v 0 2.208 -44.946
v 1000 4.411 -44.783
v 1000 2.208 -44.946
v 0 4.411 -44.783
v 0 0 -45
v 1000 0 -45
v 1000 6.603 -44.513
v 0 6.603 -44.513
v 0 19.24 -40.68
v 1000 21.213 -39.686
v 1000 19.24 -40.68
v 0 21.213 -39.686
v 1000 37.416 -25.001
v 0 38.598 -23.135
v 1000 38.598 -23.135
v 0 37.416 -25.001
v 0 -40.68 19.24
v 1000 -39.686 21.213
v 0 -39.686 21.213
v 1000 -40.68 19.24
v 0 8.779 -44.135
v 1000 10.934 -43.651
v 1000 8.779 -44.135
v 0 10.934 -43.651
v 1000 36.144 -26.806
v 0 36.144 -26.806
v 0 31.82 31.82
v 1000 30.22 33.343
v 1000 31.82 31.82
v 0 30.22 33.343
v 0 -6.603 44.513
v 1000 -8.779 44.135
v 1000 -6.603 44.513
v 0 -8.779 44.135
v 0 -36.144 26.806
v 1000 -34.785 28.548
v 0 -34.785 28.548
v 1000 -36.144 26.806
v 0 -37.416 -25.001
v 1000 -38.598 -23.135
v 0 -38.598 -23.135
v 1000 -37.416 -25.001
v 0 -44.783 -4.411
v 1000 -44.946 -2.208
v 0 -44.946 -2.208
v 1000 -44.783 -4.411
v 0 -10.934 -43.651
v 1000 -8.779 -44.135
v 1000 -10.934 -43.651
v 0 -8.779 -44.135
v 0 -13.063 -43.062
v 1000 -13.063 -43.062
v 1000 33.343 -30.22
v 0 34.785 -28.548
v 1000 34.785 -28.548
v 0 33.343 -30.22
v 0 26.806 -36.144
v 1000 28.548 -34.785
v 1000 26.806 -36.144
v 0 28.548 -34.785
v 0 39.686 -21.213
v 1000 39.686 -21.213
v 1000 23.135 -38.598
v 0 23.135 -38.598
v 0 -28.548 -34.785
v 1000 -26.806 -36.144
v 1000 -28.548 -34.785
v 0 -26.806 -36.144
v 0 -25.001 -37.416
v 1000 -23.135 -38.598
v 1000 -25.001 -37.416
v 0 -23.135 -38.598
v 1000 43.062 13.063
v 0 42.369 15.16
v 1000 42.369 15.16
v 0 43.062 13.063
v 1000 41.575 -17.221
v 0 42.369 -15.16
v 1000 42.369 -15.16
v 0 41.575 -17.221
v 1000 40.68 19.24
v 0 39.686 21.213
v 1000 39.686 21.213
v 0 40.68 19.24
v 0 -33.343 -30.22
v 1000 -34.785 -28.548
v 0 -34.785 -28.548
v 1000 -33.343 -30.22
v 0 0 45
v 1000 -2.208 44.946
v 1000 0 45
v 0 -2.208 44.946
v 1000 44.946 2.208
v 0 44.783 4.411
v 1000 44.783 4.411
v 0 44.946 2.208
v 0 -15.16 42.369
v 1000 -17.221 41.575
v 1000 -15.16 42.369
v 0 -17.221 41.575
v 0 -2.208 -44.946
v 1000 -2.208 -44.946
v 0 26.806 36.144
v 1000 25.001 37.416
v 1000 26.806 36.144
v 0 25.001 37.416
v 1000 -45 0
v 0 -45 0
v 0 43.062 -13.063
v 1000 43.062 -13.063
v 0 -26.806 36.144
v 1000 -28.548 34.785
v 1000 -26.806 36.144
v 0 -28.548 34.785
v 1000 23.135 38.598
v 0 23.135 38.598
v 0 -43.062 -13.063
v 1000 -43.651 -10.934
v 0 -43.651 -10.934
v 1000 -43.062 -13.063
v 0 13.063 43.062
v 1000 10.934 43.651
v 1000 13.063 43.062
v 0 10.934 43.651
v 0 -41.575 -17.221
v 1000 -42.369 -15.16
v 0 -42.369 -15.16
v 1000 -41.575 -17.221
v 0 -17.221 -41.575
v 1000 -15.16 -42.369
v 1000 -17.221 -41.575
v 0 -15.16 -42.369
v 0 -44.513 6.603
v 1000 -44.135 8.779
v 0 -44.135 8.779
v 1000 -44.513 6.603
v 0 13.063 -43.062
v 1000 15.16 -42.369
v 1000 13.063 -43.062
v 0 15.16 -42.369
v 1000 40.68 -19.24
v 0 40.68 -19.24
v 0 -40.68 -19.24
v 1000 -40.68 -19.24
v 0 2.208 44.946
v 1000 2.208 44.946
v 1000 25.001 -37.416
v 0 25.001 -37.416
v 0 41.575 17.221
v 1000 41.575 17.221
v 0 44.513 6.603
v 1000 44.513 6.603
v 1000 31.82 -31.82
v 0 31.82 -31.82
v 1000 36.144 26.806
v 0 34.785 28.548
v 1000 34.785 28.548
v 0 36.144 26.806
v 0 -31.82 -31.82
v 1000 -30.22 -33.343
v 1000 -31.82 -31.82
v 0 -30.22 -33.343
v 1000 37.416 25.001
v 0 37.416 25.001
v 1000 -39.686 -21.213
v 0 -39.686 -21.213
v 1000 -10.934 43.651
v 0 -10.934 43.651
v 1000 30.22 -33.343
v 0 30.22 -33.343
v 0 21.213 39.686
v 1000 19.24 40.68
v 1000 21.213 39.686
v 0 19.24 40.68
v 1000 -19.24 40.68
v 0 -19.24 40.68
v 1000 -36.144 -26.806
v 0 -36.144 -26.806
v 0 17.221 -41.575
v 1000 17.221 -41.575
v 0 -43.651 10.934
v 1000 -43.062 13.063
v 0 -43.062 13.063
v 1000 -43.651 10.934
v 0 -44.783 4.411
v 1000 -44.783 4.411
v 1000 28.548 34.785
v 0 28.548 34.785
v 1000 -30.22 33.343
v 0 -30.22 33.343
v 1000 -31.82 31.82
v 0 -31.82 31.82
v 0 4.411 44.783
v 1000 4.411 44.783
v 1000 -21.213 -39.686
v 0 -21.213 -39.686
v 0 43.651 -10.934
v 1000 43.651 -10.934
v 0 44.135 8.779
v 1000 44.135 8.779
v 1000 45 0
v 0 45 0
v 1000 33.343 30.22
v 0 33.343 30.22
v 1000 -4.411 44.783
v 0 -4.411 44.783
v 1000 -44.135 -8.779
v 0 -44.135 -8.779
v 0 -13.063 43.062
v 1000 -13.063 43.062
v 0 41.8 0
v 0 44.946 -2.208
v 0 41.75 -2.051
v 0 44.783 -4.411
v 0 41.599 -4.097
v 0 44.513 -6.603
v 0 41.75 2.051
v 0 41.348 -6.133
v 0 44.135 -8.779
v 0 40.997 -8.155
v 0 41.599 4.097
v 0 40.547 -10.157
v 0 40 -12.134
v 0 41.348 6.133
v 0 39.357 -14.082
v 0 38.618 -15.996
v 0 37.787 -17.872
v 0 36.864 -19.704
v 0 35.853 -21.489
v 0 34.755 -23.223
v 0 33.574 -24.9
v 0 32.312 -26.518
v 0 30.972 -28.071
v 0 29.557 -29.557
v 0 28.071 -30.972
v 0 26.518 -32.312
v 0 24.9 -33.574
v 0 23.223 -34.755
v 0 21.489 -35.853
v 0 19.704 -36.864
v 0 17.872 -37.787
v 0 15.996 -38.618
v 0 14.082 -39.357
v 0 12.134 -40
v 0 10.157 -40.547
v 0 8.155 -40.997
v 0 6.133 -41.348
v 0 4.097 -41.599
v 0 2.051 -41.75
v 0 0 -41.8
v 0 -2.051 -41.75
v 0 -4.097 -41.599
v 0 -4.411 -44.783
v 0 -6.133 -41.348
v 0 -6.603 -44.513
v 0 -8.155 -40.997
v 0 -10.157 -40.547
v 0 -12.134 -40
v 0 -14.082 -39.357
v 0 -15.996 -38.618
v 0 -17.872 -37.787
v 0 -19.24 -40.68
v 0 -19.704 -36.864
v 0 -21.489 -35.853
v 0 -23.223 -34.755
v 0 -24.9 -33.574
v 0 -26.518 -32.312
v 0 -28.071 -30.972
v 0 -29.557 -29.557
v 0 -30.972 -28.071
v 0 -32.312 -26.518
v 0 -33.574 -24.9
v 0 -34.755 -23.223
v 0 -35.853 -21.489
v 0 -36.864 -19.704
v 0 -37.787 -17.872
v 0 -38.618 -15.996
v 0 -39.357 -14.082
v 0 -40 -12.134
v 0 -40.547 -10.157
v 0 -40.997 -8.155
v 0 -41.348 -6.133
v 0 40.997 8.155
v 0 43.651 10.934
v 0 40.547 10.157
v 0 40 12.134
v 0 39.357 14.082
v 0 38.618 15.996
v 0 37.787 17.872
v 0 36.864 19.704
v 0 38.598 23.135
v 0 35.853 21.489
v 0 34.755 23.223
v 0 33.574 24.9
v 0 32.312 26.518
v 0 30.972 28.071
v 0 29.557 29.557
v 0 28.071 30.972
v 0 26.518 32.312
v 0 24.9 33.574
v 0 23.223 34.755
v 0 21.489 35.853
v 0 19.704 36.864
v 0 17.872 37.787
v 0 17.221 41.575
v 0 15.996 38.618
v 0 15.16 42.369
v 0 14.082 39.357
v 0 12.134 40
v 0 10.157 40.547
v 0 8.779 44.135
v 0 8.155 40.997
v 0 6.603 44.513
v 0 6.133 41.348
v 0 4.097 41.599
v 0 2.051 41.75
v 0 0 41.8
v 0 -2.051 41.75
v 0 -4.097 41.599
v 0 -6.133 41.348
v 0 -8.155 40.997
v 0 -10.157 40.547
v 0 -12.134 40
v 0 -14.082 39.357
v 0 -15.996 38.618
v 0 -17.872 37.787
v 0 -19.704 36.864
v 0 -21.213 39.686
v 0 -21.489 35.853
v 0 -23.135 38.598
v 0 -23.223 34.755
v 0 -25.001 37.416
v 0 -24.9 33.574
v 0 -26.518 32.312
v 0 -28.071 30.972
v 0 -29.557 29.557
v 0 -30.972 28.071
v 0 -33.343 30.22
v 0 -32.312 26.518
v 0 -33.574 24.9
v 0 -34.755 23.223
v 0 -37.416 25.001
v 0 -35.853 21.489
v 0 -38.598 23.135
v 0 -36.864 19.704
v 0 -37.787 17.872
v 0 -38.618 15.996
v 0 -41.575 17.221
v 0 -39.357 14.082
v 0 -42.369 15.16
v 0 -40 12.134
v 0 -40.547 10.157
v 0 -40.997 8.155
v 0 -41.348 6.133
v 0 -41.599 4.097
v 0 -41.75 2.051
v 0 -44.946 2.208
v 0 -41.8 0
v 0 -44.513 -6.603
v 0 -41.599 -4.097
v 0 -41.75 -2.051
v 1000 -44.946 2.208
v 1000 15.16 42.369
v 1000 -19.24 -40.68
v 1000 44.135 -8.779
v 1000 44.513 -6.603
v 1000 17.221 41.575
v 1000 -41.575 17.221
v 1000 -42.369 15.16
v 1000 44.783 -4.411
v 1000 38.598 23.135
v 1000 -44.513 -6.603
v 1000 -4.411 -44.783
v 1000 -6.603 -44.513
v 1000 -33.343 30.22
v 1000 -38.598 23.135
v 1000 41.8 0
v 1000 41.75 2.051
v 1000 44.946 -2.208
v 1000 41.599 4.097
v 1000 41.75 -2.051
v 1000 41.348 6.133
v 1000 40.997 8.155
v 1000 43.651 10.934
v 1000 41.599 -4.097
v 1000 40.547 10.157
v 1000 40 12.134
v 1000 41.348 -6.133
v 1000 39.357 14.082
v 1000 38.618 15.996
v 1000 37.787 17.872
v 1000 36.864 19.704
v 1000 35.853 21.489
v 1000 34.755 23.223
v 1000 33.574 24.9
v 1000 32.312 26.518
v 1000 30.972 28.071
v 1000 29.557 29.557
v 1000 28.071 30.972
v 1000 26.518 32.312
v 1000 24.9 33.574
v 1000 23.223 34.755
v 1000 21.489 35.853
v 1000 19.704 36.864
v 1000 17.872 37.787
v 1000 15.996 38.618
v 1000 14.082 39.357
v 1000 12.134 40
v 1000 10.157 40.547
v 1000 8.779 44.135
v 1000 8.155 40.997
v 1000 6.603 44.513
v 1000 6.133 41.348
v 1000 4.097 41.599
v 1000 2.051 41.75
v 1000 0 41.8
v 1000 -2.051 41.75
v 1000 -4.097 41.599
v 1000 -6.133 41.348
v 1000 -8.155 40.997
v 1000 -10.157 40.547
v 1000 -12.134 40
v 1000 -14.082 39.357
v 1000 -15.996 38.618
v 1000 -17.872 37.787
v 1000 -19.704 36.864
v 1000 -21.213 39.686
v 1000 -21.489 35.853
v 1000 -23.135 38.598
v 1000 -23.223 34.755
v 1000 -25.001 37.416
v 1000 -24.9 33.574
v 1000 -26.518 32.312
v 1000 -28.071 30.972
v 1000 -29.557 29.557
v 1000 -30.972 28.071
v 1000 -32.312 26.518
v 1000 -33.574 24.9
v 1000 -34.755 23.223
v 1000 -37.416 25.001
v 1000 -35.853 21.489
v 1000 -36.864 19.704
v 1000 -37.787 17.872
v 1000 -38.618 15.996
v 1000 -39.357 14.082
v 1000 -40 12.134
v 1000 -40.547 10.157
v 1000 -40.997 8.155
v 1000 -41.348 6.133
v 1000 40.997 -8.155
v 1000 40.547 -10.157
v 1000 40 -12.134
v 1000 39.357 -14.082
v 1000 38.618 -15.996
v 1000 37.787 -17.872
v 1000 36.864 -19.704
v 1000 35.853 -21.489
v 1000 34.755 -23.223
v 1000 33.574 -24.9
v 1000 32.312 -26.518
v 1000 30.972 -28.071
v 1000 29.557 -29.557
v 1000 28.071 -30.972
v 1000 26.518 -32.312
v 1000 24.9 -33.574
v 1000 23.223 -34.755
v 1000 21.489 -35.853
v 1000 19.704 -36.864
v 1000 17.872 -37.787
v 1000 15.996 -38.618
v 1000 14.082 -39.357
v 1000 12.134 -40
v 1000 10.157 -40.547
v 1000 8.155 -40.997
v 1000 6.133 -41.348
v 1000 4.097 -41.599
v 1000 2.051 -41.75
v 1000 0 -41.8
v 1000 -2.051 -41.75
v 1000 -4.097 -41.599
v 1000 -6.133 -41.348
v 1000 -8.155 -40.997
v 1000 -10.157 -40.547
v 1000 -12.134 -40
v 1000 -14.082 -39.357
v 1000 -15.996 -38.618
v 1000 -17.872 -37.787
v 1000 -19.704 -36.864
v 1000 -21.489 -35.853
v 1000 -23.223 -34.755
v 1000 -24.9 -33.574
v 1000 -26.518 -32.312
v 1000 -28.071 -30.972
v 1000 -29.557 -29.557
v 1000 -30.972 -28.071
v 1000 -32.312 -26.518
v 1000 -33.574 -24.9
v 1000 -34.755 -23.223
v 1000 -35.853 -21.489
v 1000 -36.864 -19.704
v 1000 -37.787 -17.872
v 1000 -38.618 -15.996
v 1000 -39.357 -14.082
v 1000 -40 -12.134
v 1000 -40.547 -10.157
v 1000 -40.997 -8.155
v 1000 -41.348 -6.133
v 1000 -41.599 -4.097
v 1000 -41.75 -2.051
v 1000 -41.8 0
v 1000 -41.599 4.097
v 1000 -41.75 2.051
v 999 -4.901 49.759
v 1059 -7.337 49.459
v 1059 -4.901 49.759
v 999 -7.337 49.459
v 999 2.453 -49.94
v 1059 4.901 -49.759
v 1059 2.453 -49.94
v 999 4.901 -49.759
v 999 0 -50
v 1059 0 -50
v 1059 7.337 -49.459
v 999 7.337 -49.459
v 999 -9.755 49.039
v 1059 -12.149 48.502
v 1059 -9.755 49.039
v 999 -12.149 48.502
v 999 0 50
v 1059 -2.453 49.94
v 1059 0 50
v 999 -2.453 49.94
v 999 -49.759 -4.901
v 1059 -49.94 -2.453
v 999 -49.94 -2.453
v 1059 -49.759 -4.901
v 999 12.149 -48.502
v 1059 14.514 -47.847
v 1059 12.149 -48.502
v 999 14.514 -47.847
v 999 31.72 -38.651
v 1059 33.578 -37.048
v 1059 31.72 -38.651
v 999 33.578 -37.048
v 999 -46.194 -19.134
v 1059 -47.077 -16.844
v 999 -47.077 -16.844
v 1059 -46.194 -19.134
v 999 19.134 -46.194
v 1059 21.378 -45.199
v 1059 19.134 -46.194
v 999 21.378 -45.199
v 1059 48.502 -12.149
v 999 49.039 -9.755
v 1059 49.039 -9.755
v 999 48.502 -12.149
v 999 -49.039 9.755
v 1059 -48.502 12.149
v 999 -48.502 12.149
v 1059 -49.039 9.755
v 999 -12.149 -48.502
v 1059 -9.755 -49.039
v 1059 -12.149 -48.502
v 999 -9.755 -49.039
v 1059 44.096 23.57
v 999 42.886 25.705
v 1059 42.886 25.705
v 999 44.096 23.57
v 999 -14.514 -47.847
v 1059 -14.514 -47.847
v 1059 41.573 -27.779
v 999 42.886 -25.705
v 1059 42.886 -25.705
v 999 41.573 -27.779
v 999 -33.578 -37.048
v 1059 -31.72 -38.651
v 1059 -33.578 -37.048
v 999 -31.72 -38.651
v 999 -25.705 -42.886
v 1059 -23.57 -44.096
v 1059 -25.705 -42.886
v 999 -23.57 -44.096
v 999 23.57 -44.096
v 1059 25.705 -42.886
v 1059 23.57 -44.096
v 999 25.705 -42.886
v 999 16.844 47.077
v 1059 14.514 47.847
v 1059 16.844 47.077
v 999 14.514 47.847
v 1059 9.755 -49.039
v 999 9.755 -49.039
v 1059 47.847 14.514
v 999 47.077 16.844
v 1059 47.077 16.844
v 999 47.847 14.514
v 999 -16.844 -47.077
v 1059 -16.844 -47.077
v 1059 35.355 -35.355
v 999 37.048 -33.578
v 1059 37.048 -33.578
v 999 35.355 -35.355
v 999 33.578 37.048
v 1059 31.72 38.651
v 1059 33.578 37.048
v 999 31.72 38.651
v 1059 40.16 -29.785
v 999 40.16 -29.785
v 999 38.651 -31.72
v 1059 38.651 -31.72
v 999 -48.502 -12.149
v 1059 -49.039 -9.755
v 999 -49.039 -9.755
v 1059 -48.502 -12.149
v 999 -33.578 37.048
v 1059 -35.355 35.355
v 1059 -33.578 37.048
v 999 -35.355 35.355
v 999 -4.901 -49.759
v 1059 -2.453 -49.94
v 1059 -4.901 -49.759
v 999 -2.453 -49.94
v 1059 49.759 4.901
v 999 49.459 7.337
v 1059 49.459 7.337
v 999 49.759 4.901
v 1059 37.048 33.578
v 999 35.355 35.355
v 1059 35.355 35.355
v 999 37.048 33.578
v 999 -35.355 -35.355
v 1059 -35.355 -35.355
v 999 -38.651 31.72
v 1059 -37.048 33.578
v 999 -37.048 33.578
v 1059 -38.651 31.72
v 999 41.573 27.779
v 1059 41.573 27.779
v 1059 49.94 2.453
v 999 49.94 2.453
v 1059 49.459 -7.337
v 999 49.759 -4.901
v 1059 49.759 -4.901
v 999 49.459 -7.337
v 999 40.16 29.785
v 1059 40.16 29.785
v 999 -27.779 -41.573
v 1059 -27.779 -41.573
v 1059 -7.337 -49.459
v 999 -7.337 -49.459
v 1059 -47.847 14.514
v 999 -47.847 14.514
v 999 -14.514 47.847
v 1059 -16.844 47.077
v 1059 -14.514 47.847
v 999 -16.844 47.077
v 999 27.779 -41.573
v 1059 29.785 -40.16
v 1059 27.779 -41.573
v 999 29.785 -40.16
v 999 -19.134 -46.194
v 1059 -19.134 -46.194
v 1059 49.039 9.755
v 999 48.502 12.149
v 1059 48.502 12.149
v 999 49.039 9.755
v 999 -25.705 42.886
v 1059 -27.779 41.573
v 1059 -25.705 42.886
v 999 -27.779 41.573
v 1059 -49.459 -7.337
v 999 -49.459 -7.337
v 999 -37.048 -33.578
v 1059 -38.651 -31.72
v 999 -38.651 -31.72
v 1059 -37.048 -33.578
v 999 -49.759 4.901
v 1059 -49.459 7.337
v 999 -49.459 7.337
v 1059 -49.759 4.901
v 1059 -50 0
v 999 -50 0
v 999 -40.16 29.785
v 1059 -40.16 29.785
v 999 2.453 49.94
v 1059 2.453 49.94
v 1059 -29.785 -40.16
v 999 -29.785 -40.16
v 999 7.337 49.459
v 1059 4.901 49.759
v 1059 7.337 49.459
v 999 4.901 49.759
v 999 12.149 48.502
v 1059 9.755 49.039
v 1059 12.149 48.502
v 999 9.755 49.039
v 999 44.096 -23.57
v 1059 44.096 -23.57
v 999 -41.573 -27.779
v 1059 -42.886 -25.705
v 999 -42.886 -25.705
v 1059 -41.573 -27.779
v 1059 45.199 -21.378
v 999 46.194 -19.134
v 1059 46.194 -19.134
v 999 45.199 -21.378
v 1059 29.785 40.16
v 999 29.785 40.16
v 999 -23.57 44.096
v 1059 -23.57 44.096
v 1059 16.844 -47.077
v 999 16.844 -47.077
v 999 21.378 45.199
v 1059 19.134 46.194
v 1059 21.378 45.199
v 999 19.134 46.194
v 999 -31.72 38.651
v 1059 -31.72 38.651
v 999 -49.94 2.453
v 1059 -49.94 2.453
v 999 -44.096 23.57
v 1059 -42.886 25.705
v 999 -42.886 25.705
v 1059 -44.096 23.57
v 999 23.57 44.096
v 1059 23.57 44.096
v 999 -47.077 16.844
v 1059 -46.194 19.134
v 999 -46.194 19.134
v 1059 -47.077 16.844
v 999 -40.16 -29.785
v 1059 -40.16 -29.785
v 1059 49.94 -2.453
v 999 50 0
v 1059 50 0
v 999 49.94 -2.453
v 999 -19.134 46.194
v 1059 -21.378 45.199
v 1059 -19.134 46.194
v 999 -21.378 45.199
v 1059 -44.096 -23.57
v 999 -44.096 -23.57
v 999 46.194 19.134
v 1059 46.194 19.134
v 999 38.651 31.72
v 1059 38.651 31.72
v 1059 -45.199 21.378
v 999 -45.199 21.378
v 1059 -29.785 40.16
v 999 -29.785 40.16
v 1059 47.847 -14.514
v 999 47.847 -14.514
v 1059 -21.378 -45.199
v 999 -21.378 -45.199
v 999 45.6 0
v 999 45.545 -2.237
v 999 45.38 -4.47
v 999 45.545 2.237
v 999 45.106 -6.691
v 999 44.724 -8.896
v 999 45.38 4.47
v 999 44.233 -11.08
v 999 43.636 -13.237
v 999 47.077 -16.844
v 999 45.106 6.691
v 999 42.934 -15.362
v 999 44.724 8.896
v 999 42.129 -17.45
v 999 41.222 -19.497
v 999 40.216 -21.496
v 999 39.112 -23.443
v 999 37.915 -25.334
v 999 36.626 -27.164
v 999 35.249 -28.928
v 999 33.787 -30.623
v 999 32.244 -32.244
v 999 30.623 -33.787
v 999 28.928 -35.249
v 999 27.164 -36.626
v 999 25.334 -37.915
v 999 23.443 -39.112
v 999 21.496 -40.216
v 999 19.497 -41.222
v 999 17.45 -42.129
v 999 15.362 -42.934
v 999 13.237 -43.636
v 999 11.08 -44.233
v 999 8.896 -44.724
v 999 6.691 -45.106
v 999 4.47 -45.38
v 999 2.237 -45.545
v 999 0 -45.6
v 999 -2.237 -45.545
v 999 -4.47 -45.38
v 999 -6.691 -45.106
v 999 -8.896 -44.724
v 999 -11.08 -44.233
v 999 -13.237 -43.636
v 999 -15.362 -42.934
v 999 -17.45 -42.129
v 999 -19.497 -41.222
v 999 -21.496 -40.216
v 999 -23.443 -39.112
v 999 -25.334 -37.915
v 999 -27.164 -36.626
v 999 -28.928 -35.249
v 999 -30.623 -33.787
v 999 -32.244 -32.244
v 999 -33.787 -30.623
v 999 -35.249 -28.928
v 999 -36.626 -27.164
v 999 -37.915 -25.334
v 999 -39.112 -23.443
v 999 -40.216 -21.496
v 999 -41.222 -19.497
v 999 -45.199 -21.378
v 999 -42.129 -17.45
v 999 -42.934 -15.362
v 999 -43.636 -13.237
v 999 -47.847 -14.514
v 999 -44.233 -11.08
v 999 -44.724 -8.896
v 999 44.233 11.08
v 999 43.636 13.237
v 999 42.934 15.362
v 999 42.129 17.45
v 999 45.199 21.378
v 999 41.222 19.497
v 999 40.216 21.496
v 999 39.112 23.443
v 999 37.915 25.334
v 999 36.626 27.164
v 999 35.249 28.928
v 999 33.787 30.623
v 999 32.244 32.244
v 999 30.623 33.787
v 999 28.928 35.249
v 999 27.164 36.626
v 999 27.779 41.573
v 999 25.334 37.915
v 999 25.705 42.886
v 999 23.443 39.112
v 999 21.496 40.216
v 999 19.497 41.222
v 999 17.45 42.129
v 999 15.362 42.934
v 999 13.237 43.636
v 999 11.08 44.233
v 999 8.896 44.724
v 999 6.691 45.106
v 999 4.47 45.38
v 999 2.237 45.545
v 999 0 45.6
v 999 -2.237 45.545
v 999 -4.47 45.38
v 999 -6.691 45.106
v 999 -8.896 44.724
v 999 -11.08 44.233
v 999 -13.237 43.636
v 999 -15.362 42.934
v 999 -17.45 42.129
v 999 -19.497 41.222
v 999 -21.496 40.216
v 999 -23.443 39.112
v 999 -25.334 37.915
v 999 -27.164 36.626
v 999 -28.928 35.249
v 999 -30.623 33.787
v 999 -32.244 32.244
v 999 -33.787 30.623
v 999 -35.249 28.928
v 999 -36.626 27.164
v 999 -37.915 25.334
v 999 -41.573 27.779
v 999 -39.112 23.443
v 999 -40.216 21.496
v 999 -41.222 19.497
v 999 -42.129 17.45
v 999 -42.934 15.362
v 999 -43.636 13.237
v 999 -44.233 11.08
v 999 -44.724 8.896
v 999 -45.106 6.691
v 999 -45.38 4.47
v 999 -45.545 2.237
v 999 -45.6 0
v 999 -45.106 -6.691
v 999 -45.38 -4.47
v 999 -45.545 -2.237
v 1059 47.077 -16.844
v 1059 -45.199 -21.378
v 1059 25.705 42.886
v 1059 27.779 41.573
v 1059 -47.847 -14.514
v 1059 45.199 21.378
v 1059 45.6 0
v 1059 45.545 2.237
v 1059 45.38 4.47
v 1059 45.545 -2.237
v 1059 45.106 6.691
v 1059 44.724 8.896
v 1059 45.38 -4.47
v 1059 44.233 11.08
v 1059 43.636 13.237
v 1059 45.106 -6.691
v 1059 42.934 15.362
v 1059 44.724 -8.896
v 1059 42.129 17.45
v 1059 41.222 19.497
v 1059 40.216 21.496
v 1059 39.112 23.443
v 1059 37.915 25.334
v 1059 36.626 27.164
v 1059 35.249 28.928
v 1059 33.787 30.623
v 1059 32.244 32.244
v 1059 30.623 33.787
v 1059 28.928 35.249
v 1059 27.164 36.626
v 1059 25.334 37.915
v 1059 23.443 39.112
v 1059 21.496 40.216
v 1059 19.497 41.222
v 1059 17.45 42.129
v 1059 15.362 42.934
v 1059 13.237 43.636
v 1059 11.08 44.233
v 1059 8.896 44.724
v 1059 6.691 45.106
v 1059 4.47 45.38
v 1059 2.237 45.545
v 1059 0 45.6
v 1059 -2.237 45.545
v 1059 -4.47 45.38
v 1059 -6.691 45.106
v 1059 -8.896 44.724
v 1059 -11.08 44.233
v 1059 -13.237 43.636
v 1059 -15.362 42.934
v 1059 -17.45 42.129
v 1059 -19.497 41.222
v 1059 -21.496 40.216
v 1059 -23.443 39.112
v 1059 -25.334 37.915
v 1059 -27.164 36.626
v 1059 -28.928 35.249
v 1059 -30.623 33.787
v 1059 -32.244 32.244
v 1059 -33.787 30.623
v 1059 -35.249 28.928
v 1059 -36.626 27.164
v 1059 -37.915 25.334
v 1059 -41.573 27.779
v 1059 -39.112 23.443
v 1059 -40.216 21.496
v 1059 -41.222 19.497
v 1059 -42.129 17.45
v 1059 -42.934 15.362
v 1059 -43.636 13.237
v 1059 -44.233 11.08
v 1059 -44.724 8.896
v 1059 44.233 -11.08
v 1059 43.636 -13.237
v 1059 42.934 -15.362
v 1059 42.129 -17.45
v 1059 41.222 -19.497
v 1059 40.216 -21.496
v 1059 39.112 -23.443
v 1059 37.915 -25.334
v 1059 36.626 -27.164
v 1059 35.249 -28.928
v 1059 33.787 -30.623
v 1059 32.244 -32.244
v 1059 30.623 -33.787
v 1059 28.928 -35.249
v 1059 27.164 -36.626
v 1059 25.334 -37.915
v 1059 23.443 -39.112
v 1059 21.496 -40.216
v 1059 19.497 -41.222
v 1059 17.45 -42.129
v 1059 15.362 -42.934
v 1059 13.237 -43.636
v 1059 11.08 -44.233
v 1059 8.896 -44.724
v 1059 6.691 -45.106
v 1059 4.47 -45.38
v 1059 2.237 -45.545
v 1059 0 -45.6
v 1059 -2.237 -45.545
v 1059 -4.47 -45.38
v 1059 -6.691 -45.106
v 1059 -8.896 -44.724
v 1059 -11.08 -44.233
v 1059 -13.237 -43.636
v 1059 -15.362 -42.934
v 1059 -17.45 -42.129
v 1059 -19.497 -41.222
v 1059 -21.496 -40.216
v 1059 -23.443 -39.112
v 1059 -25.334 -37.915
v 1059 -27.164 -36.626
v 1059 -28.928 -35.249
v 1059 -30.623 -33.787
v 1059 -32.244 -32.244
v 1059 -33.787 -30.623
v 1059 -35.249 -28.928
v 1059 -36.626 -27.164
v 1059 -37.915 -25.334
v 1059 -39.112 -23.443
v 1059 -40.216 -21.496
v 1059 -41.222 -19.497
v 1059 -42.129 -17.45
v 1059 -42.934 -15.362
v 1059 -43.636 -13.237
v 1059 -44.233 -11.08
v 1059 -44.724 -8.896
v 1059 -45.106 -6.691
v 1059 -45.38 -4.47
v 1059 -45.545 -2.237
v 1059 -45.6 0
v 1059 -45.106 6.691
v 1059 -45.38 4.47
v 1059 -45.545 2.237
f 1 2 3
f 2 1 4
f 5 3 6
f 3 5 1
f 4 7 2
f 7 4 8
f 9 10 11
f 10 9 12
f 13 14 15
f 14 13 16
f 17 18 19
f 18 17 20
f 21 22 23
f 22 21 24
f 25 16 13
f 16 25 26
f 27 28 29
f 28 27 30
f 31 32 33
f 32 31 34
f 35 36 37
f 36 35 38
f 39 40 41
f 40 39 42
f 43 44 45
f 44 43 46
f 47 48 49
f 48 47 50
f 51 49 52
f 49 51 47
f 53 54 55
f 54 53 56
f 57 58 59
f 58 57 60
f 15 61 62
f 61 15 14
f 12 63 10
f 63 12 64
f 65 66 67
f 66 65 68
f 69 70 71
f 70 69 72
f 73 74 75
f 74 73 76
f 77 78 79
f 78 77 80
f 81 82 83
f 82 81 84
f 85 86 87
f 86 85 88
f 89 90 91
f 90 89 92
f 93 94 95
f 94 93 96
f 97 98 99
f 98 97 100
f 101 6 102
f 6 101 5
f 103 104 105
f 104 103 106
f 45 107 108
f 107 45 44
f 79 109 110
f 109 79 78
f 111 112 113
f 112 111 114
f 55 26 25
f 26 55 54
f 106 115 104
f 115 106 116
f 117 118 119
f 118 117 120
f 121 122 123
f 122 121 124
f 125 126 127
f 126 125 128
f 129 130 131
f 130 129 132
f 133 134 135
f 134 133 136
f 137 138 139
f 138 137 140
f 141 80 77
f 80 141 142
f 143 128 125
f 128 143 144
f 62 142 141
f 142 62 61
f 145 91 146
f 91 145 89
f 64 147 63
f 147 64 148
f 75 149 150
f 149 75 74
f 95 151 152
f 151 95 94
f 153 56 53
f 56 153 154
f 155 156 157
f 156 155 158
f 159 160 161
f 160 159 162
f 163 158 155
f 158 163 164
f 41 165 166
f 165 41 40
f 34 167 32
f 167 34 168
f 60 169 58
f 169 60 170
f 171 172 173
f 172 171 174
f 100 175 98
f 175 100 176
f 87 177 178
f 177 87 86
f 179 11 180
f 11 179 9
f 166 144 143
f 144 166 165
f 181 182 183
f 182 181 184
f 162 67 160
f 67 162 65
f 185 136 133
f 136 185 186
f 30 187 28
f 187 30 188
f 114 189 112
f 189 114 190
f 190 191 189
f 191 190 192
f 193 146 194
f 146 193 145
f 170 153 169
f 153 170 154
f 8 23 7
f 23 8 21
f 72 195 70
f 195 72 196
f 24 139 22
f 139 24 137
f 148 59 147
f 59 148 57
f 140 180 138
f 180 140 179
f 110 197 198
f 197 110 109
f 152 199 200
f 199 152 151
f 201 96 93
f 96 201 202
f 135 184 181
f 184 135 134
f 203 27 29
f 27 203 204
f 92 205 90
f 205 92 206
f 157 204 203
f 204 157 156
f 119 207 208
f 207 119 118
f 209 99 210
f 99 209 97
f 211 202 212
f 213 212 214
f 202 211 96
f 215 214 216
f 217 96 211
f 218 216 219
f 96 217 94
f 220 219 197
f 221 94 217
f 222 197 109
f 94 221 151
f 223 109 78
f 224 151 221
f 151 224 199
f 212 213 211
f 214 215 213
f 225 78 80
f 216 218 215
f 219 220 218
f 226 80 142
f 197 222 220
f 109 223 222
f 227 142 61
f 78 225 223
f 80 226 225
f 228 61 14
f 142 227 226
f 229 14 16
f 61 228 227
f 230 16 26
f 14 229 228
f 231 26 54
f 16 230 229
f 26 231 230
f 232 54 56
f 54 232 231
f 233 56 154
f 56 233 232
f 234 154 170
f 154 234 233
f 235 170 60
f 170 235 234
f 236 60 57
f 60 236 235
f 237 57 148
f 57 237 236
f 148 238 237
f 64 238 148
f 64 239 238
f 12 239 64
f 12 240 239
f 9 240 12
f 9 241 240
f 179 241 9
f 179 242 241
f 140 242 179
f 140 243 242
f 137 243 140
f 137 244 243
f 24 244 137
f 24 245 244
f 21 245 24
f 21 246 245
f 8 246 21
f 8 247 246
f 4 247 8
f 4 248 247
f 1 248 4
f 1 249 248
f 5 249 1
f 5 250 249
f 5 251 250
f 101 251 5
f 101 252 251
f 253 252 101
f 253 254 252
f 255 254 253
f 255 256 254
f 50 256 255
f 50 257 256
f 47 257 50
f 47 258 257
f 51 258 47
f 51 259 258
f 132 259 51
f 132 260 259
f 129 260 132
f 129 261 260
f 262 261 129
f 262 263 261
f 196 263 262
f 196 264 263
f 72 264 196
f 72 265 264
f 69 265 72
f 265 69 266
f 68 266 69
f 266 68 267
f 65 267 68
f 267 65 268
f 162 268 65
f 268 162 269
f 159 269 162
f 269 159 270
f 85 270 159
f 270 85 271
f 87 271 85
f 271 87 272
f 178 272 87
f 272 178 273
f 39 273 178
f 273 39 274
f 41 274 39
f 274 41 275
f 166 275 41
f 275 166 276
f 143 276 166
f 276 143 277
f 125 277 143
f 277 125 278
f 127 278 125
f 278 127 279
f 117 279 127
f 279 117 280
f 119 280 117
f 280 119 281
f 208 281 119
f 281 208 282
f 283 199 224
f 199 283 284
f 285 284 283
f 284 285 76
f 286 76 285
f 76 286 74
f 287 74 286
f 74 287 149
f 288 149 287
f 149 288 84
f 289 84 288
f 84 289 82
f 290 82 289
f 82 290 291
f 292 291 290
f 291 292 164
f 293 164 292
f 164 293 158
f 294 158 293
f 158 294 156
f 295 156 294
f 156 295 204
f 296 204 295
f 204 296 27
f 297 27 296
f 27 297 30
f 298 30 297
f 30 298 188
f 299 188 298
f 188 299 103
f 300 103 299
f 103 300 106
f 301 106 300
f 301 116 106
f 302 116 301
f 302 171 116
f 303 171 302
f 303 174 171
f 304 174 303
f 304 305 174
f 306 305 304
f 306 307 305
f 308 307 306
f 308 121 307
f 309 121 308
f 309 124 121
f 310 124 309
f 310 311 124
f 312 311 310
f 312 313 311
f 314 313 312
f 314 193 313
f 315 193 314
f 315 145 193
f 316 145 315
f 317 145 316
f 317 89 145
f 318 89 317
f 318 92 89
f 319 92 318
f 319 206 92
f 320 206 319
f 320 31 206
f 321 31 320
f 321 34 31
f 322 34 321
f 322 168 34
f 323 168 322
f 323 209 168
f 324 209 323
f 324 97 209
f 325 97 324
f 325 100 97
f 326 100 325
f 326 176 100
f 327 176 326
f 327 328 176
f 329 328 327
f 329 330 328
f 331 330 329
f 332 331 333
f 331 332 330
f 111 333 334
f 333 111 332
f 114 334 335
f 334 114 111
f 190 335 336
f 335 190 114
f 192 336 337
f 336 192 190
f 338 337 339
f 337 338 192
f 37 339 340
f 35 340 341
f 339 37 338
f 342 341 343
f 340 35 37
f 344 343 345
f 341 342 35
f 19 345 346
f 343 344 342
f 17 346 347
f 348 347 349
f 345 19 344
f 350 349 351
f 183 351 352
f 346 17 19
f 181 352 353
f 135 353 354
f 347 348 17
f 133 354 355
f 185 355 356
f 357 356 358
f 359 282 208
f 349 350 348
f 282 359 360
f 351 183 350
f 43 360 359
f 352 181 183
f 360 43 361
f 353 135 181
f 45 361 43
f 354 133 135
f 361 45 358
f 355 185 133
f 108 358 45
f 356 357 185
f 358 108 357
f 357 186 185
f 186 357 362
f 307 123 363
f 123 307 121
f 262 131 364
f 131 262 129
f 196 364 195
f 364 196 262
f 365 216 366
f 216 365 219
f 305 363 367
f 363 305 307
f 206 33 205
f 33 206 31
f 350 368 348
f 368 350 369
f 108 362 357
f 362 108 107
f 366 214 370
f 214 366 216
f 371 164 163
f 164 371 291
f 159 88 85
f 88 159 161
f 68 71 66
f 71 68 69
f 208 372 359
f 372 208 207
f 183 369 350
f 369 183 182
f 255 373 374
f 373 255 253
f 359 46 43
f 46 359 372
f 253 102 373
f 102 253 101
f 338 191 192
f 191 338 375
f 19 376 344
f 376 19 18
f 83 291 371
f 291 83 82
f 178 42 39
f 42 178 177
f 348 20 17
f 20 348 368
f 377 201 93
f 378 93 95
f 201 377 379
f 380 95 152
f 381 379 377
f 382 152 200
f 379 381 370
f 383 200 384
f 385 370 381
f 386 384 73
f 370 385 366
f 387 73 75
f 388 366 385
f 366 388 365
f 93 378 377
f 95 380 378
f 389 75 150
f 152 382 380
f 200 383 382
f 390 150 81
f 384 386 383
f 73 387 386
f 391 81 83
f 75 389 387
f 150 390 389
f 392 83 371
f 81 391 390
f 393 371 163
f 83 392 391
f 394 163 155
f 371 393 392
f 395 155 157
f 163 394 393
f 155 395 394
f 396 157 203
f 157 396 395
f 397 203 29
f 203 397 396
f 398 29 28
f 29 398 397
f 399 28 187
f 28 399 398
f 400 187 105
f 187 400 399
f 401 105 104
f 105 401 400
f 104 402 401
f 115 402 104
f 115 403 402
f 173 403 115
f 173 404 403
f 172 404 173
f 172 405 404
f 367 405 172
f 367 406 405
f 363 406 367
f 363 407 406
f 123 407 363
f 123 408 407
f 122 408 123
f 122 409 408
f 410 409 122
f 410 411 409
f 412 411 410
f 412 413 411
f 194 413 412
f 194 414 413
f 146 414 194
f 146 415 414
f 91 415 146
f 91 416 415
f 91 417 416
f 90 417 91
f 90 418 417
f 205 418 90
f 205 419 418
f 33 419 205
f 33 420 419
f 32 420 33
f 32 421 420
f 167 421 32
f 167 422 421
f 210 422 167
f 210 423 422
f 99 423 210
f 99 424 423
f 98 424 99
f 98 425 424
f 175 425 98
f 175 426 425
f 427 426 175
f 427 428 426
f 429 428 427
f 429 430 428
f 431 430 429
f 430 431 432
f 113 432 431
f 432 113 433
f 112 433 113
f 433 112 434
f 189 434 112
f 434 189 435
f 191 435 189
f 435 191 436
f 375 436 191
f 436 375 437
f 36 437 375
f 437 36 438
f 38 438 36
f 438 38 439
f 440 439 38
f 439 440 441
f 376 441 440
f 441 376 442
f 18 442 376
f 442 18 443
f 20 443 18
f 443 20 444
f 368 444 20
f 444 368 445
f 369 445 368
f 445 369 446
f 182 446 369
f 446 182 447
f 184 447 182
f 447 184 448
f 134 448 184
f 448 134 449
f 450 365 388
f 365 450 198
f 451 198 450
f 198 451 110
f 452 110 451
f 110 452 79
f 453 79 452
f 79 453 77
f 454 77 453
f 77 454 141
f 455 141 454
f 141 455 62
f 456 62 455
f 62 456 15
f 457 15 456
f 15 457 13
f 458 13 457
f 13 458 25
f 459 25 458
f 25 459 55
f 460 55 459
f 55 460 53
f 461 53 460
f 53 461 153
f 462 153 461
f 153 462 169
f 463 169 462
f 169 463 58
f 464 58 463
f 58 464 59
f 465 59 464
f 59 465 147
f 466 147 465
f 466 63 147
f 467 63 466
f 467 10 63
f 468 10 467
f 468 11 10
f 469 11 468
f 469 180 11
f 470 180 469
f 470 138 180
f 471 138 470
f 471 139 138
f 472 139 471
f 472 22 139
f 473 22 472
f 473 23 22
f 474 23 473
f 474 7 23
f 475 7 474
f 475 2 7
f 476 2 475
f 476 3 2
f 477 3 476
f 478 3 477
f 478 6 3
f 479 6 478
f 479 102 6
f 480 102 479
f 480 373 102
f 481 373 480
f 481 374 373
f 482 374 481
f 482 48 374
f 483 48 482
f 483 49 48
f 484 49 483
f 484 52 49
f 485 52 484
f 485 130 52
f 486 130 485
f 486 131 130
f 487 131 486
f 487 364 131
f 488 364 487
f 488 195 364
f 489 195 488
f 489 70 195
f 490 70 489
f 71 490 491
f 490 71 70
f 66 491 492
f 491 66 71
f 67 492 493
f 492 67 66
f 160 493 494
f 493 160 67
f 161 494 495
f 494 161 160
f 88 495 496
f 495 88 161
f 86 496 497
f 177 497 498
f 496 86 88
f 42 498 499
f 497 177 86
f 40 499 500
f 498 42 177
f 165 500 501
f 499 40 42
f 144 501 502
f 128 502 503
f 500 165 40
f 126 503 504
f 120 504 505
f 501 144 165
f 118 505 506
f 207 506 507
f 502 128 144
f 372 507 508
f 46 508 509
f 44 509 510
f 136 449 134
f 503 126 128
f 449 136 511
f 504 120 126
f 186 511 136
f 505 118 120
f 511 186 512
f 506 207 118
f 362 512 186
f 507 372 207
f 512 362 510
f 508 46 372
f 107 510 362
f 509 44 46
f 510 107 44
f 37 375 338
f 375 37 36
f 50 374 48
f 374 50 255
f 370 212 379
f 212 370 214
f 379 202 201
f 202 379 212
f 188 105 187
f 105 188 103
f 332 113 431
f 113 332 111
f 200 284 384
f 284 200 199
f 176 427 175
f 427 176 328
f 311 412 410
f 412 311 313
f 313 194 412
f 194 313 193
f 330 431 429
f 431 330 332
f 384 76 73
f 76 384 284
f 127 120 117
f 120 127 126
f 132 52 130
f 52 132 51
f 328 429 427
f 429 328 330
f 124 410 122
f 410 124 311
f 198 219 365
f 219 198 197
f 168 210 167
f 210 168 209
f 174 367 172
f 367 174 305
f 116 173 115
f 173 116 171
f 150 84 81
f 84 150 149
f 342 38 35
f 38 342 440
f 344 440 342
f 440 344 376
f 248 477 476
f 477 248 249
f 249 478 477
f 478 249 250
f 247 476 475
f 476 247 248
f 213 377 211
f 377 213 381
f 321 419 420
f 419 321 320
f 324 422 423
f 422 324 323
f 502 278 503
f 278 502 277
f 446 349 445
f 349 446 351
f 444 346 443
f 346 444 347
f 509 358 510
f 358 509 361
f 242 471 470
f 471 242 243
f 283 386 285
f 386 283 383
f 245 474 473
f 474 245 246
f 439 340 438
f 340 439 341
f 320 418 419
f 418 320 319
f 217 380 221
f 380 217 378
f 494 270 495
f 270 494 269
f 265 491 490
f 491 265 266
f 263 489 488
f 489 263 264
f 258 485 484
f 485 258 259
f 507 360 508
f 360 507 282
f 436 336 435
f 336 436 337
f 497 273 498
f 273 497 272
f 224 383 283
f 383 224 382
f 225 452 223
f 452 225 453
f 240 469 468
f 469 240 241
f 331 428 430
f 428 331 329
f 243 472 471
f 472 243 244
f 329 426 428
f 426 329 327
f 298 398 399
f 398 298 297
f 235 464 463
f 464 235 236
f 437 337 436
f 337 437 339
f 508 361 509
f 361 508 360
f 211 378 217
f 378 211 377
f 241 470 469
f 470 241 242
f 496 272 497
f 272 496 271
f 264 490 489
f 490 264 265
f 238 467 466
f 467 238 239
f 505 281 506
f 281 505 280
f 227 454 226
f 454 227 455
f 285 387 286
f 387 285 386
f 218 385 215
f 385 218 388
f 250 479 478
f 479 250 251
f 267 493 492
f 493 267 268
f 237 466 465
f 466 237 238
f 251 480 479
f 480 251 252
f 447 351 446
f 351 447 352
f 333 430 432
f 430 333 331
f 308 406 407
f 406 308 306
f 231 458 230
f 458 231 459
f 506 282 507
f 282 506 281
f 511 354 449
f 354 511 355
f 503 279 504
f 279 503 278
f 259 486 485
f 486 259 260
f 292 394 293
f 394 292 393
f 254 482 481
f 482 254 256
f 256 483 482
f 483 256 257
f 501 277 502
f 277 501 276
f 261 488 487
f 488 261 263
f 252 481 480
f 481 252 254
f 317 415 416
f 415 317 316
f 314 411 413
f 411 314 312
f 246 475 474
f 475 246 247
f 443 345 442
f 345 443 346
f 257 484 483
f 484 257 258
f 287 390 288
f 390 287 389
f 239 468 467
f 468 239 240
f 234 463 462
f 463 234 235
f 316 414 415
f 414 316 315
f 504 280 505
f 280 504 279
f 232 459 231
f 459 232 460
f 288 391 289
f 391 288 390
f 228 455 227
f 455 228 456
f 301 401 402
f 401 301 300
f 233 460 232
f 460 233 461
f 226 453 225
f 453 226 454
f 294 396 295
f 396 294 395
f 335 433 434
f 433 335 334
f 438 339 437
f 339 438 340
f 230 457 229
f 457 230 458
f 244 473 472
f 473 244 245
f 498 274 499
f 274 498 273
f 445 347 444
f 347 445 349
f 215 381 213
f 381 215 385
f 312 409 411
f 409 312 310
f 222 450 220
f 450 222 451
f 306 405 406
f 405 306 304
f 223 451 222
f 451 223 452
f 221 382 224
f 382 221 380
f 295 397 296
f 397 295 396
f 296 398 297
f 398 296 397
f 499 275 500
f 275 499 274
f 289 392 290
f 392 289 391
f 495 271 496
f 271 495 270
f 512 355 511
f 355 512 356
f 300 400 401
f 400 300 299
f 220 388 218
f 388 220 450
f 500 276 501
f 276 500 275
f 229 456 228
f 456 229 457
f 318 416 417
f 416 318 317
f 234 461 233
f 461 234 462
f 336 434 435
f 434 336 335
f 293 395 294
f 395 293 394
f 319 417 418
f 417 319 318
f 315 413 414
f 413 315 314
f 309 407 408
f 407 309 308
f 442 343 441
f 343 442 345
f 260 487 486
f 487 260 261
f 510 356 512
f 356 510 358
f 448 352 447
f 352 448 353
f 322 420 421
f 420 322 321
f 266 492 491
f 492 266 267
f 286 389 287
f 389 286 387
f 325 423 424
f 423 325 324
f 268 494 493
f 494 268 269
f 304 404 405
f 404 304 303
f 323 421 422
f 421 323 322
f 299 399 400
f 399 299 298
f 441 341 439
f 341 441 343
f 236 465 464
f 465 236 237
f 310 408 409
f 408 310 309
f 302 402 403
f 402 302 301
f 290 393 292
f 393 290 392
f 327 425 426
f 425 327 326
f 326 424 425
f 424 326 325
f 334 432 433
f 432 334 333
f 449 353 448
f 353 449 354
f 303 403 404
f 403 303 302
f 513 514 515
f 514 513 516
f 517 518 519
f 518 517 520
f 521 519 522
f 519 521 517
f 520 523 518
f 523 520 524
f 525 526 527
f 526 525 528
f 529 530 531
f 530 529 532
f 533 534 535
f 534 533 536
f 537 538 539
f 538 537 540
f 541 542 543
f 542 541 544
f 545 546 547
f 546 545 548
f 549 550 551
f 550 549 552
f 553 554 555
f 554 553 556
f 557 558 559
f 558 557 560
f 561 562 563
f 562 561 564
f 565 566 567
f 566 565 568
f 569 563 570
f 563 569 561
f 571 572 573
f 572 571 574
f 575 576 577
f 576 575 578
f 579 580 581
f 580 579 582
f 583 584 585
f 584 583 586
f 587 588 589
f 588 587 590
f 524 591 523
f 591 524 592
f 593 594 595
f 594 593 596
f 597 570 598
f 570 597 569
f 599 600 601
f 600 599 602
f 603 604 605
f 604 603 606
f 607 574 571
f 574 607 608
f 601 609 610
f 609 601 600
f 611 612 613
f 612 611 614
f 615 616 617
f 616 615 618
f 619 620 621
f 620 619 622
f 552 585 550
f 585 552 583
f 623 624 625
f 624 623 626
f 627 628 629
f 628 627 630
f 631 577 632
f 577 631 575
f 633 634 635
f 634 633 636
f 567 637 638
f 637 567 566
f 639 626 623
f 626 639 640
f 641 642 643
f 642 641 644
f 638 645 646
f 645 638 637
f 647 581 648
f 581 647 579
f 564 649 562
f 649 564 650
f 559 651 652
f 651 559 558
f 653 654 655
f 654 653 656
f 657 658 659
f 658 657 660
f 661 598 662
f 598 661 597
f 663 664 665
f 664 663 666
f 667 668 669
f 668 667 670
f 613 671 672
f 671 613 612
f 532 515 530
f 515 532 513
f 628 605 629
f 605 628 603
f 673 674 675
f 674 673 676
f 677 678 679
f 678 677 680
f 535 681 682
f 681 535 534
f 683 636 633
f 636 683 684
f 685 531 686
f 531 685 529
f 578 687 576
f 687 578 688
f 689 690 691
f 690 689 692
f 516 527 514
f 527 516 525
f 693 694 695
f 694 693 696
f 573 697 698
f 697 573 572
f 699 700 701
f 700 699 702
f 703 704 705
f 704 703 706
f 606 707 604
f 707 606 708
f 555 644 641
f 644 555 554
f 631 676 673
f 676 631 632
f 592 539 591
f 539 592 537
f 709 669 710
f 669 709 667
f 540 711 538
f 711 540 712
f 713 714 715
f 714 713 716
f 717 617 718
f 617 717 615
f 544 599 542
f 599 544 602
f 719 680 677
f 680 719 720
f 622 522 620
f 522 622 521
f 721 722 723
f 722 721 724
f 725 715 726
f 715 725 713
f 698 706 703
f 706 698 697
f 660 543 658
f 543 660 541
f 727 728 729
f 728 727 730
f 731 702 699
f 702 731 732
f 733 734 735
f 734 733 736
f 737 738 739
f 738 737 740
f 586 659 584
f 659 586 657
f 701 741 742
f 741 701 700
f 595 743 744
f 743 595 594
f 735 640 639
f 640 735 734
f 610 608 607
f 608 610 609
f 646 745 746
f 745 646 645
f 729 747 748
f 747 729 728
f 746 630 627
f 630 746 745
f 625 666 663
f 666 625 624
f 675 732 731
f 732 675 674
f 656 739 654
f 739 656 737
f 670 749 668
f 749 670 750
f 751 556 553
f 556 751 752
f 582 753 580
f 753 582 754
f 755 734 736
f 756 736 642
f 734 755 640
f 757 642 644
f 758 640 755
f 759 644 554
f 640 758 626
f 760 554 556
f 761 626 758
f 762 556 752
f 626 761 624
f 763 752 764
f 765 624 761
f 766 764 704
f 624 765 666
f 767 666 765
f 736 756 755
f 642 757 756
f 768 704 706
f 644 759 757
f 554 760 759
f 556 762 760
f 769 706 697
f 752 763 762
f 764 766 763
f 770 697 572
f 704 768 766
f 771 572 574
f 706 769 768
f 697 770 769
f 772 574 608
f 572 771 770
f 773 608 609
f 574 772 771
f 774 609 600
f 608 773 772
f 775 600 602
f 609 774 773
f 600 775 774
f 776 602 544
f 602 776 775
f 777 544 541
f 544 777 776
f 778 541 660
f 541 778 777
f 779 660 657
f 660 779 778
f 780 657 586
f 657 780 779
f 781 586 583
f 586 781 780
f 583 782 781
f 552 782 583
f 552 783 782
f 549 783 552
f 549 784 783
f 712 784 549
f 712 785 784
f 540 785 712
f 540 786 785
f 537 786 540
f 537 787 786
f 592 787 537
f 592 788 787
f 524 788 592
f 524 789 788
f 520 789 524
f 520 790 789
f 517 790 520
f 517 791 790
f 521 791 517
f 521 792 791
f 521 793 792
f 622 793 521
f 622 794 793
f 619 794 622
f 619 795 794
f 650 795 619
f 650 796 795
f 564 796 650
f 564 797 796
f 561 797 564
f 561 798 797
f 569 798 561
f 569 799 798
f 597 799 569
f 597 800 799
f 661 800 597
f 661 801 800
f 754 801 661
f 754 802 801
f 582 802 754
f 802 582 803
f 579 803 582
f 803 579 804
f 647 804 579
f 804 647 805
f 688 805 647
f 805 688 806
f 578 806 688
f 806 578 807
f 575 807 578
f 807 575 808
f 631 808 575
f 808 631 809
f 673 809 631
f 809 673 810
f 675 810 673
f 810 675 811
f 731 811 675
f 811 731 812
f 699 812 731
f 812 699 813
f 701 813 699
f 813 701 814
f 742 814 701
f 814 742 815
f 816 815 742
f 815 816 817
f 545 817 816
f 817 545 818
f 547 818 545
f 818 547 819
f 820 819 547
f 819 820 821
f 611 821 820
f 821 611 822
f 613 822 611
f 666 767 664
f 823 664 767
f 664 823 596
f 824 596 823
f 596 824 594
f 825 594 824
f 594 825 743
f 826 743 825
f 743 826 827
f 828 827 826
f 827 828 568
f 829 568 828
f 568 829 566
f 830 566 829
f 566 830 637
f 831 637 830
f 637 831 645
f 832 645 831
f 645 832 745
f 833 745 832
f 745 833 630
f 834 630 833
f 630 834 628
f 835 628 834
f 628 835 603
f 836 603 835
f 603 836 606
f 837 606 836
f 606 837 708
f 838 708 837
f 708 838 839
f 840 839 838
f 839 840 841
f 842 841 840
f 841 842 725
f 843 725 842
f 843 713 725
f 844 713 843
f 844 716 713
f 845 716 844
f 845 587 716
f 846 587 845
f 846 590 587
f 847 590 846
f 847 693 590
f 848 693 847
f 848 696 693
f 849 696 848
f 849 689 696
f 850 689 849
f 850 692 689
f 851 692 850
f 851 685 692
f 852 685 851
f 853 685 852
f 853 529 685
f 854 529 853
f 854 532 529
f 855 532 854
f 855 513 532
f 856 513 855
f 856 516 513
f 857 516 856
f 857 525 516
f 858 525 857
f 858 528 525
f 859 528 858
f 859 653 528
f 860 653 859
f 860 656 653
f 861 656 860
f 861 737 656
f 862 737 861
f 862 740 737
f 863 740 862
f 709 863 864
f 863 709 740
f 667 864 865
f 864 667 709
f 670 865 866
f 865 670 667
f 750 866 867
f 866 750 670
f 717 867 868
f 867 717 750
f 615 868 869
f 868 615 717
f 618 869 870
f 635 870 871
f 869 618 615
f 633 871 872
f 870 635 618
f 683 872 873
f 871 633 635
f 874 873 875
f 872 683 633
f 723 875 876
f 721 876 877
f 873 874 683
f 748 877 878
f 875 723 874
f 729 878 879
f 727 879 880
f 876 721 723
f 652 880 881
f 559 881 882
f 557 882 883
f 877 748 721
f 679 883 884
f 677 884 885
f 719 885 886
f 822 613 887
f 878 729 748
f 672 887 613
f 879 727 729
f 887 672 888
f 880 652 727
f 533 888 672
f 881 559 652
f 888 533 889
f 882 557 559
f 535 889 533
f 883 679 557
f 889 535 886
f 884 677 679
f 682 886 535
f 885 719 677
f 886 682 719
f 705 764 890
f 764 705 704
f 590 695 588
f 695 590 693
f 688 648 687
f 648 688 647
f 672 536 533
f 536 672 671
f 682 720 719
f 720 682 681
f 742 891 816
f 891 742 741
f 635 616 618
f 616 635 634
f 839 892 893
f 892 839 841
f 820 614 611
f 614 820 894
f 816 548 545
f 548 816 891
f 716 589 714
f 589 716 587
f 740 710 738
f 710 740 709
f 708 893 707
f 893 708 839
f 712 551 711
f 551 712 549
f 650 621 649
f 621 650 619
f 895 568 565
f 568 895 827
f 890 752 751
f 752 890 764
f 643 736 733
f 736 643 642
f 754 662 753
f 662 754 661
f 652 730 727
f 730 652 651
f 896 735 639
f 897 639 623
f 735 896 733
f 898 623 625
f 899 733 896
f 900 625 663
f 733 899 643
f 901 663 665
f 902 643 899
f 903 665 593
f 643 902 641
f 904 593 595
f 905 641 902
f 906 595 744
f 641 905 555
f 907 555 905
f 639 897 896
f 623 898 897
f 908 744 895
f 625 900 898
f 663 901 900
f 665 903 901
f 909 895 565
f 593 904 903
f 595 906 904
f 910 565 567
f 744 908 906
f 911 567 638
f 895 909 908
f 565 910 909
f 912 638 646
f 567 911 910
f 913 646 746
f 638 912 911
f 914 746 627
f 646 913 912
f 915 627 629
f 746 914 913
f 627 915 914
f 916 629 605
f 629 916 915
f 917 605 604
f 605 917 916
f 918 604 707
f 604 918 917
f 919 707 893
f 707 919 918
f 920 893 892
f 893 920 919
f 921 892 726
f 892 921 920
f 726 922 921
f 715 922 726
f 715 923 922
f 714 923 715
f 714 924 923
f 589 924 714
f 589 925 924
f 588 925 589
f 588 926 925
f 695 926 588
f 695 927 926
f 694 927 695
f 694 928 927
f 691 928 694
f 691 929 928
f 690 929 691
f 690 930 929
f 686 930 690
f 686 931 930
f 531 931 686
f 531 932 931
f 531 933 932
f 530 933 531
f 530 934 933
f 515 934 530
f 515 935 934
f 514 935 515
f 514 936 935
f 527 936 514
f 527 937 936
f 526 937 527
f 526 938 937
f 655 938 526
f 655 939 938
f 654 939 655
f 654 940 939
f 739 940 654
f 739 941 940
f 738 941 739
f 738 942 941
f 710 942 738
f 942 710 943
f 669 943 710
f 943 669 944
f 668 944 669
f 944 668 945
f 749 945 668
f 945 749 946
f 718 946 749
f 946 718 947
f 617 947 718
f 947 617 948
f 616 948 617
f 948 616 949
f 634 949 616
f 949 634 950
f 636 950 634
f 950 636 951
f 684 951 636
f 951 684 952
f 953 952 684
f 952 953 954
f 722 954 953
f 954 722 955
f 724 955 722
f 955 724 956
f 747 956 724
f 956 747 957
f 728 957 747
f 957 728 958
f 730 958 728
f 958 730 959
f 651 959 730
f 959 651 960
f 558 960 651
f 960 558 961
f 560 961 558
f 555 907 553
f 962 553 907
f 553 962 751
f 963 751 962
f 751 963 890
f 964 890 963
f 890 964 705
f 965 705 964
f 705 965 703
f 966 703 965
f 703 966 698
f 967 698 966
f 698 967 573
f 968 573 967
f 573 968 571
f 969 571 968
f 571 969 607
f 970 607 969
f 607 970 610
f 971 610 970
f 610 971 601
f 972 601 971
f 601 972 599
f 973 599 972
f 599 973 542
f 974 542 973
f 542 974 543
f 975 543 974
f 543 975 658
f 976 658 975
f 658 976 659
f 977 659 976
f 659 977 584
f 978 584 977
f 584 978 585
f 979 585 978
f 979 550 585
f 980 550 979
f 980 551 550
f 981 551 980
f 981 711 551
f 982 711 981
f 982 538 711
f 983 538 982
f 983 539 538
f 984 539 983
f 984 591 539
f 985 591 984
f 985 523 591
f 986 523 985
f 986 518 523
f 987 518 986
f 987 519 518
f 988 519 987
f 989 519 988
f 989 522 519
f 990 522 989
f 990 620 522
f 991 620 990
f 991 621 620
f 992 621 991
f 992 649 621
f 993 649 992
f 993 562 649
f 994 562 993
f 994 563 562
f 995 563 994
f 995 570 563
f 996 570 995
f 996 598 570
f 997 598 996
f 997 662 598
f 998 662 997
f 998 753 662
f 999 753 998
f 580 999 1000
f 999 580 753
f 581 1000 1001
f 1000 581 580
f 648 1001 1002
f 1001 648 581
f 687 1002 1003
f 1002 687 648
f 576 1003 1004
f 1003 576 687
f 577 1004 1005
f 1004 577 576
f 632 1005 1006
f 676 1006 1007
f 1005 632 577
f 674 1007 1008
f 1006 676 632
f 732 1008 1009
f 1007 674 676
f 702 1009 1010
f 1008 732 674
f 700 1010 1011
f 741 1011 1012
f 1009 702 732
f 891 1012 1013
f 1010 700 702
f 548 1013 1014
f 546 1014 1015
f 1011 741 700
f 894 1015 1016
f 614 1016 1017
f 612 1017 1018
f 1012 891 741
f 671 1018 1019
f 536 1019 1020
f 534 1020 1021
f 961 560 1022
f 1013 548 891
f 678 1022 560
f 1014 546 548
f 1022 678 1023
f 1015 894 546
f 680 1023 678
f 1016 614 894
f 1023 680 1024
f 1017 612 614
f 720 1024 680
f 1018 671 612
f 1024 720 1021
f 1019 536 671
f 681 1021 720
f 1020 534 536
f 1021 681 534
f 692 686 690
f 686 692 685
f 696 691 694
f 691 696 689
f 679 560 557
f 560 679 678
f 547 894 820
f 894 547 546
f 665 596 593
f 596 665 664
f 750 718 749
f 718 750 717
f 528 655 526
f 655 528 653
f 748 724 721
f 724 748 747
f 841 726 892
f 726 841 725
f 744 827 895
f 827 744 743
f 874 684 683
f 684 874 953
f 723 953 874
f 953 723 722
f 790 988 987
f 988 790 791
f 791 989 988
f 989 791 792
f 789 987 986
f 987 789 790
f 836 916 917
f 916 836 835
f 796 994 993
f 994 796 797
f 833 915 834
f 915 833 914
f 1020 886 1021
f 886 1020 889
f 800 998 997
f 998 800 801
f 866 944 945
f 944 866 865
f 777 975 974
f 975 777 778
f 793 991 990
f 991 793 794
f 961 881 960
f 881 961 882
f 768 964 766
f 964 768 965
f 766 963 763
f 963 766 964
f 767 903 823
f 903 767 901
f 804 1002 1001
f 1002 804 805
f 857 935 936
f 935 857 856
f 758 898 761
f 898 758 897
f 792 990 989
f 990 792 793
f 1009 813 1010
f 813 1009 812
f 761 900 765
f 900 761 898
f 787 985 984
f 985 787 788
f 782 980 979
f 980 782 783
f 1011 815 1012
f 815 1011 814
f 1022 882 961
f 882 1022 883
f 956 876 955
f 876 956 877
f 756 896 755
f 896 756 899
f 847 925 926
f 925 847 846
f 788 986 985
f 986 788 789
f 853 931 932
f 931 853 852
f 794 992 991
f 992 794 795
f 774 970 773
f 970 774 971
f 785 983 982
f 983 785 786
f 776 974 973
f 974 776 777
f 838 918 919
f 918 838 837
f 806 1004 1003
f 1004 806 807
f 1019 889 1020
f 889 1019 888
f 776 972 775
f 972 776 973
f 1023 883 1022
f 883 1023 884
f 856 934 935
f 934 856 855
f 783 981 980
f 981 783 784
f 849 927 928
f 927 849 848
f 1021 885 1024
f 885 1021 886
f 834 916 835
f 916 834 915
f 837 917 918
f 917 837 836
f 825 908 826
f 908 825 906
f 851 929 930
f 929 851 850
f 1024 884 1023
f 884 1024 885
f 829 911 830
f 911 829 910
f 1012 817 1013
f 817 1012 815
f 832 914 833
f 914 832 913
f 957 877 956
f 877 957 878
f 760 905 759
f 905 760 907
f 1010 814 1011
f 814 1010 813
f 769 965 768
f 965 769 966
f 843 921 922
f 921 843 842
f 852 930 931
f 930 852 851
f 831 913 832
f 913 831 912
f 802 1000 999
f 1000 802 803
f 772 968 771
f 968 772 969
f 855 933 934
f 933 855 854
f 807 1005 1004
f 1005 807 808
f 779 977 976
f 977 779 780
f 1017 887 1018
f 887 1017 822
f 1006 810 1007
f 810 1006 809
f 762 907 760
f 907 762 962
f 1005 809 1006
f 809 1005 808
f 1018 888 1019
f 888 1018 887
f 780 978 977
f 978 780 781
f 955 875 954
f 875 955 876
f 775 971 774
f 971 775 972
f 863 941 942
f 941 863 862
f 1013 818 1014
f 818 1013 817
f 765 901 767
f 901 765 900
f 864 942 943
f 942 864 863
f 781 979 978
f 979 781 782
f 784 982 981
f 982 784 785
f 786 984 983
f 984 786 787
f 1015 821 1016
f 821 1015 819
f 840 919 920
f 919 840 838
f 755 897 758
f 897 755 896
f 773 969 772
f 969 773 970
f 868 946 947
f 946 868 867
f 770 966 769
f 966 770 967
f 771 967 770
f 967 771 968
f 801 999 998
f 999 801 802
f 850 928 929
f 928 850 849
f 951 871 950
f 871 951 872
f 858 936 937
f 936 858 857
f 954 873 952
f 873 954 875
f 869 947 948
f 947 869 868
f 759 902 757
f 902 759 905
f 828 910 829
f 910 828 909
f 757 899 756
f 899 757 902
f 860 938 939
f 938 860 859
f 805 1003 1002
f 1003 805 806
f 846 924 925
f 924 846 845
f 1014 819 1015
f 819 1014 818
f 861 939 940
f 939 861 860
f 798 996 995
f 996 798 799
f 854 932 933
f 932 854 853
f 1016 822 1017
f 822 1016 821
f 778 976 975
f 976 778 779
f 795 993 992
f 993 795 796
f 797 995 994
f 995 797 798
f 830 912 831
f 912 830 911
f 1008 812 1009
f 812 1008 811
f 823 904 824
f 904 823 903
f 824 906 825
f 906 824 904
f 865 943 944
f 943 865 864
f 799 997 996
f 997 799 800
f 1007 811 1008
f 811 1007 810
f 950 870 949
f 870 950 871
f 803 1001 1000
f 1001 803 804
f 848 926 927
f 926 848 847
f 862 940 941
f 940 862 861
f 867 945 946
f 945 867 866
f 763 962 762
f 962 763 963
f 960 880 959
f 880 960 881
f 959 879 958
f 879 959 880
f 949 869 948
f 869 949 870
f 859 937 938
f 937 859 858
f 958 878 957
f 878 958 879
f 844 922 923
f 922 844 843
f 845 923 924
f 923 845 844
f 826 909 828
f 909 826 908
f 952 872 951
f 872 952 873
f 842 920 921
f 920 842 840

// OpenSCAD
// HT 90 pipe (DN90) - 1000 mm length
// One connected solid, oriented along X so front/back/left/right show length.

$fn = 128;

// Parameters
pipe_standard = 1; //[1:1:1]
nominal_diameter_mm = 90; //[50:180:1]
length_mm = 1000; //[500:2000:10]
include_end_fitting = 1; //[0:1:1]

// Typical HT DN90 approximations (editable)
pipe_od = 90; //[50:180:1]
pipe_wall = 3.2; //[1.6:6.4:0.1]

// Socket (muffe) at one end
fitting_length = 60; //[30:120:1]
fitting_wall = 4; //[2:8:0.1]
fitting_od_extra = 10; //[5:20:1]
socket_clearance = 0.6; //[0.2:1.5:0.1]

// Overlap to guarantee manifold union
overlap = 1; //[0.5:2:0.1]

// Derived
pipe_or = pipe_od/2;
pipe_ir = pipe_or - pipe_wall;

socket_or = pipe_or + fitting_od_extra/2;
socket_ir = pipe_or + socket_clearance;

// Safety clamps
pipe_ir_safe = max(0.01, pipe_ir);
socket_ir_safe = max(0.01, min(socket_or - 0.01, socket_ir));

module tube_x(len, ro, ri) {
    // Hollow tube along X axis, starting at x=0
    rotate([0, 90, 0])
        difference() {
            cylinder(h=len, r=ro, center=false);
            translate([0, 0, -0.01])
                cylinder(h=len + 0.02, r=ri, center=false);
        }
}

module ht_pipe() {
    color([0.85, 0.85, 0.8])
    union() {
        // Main pipe body
        tube_x(length_mm, pipe_or, pipe_ir_safe);

        // End socket (connected with calculated overlap)
        if (include_end_fitting) {
            translate([length_mm - overlap, 0, 0])
                tube_x(fitting_length, socket_or, socket_ir_safe);
        }
    }
}

ht_pipe();
